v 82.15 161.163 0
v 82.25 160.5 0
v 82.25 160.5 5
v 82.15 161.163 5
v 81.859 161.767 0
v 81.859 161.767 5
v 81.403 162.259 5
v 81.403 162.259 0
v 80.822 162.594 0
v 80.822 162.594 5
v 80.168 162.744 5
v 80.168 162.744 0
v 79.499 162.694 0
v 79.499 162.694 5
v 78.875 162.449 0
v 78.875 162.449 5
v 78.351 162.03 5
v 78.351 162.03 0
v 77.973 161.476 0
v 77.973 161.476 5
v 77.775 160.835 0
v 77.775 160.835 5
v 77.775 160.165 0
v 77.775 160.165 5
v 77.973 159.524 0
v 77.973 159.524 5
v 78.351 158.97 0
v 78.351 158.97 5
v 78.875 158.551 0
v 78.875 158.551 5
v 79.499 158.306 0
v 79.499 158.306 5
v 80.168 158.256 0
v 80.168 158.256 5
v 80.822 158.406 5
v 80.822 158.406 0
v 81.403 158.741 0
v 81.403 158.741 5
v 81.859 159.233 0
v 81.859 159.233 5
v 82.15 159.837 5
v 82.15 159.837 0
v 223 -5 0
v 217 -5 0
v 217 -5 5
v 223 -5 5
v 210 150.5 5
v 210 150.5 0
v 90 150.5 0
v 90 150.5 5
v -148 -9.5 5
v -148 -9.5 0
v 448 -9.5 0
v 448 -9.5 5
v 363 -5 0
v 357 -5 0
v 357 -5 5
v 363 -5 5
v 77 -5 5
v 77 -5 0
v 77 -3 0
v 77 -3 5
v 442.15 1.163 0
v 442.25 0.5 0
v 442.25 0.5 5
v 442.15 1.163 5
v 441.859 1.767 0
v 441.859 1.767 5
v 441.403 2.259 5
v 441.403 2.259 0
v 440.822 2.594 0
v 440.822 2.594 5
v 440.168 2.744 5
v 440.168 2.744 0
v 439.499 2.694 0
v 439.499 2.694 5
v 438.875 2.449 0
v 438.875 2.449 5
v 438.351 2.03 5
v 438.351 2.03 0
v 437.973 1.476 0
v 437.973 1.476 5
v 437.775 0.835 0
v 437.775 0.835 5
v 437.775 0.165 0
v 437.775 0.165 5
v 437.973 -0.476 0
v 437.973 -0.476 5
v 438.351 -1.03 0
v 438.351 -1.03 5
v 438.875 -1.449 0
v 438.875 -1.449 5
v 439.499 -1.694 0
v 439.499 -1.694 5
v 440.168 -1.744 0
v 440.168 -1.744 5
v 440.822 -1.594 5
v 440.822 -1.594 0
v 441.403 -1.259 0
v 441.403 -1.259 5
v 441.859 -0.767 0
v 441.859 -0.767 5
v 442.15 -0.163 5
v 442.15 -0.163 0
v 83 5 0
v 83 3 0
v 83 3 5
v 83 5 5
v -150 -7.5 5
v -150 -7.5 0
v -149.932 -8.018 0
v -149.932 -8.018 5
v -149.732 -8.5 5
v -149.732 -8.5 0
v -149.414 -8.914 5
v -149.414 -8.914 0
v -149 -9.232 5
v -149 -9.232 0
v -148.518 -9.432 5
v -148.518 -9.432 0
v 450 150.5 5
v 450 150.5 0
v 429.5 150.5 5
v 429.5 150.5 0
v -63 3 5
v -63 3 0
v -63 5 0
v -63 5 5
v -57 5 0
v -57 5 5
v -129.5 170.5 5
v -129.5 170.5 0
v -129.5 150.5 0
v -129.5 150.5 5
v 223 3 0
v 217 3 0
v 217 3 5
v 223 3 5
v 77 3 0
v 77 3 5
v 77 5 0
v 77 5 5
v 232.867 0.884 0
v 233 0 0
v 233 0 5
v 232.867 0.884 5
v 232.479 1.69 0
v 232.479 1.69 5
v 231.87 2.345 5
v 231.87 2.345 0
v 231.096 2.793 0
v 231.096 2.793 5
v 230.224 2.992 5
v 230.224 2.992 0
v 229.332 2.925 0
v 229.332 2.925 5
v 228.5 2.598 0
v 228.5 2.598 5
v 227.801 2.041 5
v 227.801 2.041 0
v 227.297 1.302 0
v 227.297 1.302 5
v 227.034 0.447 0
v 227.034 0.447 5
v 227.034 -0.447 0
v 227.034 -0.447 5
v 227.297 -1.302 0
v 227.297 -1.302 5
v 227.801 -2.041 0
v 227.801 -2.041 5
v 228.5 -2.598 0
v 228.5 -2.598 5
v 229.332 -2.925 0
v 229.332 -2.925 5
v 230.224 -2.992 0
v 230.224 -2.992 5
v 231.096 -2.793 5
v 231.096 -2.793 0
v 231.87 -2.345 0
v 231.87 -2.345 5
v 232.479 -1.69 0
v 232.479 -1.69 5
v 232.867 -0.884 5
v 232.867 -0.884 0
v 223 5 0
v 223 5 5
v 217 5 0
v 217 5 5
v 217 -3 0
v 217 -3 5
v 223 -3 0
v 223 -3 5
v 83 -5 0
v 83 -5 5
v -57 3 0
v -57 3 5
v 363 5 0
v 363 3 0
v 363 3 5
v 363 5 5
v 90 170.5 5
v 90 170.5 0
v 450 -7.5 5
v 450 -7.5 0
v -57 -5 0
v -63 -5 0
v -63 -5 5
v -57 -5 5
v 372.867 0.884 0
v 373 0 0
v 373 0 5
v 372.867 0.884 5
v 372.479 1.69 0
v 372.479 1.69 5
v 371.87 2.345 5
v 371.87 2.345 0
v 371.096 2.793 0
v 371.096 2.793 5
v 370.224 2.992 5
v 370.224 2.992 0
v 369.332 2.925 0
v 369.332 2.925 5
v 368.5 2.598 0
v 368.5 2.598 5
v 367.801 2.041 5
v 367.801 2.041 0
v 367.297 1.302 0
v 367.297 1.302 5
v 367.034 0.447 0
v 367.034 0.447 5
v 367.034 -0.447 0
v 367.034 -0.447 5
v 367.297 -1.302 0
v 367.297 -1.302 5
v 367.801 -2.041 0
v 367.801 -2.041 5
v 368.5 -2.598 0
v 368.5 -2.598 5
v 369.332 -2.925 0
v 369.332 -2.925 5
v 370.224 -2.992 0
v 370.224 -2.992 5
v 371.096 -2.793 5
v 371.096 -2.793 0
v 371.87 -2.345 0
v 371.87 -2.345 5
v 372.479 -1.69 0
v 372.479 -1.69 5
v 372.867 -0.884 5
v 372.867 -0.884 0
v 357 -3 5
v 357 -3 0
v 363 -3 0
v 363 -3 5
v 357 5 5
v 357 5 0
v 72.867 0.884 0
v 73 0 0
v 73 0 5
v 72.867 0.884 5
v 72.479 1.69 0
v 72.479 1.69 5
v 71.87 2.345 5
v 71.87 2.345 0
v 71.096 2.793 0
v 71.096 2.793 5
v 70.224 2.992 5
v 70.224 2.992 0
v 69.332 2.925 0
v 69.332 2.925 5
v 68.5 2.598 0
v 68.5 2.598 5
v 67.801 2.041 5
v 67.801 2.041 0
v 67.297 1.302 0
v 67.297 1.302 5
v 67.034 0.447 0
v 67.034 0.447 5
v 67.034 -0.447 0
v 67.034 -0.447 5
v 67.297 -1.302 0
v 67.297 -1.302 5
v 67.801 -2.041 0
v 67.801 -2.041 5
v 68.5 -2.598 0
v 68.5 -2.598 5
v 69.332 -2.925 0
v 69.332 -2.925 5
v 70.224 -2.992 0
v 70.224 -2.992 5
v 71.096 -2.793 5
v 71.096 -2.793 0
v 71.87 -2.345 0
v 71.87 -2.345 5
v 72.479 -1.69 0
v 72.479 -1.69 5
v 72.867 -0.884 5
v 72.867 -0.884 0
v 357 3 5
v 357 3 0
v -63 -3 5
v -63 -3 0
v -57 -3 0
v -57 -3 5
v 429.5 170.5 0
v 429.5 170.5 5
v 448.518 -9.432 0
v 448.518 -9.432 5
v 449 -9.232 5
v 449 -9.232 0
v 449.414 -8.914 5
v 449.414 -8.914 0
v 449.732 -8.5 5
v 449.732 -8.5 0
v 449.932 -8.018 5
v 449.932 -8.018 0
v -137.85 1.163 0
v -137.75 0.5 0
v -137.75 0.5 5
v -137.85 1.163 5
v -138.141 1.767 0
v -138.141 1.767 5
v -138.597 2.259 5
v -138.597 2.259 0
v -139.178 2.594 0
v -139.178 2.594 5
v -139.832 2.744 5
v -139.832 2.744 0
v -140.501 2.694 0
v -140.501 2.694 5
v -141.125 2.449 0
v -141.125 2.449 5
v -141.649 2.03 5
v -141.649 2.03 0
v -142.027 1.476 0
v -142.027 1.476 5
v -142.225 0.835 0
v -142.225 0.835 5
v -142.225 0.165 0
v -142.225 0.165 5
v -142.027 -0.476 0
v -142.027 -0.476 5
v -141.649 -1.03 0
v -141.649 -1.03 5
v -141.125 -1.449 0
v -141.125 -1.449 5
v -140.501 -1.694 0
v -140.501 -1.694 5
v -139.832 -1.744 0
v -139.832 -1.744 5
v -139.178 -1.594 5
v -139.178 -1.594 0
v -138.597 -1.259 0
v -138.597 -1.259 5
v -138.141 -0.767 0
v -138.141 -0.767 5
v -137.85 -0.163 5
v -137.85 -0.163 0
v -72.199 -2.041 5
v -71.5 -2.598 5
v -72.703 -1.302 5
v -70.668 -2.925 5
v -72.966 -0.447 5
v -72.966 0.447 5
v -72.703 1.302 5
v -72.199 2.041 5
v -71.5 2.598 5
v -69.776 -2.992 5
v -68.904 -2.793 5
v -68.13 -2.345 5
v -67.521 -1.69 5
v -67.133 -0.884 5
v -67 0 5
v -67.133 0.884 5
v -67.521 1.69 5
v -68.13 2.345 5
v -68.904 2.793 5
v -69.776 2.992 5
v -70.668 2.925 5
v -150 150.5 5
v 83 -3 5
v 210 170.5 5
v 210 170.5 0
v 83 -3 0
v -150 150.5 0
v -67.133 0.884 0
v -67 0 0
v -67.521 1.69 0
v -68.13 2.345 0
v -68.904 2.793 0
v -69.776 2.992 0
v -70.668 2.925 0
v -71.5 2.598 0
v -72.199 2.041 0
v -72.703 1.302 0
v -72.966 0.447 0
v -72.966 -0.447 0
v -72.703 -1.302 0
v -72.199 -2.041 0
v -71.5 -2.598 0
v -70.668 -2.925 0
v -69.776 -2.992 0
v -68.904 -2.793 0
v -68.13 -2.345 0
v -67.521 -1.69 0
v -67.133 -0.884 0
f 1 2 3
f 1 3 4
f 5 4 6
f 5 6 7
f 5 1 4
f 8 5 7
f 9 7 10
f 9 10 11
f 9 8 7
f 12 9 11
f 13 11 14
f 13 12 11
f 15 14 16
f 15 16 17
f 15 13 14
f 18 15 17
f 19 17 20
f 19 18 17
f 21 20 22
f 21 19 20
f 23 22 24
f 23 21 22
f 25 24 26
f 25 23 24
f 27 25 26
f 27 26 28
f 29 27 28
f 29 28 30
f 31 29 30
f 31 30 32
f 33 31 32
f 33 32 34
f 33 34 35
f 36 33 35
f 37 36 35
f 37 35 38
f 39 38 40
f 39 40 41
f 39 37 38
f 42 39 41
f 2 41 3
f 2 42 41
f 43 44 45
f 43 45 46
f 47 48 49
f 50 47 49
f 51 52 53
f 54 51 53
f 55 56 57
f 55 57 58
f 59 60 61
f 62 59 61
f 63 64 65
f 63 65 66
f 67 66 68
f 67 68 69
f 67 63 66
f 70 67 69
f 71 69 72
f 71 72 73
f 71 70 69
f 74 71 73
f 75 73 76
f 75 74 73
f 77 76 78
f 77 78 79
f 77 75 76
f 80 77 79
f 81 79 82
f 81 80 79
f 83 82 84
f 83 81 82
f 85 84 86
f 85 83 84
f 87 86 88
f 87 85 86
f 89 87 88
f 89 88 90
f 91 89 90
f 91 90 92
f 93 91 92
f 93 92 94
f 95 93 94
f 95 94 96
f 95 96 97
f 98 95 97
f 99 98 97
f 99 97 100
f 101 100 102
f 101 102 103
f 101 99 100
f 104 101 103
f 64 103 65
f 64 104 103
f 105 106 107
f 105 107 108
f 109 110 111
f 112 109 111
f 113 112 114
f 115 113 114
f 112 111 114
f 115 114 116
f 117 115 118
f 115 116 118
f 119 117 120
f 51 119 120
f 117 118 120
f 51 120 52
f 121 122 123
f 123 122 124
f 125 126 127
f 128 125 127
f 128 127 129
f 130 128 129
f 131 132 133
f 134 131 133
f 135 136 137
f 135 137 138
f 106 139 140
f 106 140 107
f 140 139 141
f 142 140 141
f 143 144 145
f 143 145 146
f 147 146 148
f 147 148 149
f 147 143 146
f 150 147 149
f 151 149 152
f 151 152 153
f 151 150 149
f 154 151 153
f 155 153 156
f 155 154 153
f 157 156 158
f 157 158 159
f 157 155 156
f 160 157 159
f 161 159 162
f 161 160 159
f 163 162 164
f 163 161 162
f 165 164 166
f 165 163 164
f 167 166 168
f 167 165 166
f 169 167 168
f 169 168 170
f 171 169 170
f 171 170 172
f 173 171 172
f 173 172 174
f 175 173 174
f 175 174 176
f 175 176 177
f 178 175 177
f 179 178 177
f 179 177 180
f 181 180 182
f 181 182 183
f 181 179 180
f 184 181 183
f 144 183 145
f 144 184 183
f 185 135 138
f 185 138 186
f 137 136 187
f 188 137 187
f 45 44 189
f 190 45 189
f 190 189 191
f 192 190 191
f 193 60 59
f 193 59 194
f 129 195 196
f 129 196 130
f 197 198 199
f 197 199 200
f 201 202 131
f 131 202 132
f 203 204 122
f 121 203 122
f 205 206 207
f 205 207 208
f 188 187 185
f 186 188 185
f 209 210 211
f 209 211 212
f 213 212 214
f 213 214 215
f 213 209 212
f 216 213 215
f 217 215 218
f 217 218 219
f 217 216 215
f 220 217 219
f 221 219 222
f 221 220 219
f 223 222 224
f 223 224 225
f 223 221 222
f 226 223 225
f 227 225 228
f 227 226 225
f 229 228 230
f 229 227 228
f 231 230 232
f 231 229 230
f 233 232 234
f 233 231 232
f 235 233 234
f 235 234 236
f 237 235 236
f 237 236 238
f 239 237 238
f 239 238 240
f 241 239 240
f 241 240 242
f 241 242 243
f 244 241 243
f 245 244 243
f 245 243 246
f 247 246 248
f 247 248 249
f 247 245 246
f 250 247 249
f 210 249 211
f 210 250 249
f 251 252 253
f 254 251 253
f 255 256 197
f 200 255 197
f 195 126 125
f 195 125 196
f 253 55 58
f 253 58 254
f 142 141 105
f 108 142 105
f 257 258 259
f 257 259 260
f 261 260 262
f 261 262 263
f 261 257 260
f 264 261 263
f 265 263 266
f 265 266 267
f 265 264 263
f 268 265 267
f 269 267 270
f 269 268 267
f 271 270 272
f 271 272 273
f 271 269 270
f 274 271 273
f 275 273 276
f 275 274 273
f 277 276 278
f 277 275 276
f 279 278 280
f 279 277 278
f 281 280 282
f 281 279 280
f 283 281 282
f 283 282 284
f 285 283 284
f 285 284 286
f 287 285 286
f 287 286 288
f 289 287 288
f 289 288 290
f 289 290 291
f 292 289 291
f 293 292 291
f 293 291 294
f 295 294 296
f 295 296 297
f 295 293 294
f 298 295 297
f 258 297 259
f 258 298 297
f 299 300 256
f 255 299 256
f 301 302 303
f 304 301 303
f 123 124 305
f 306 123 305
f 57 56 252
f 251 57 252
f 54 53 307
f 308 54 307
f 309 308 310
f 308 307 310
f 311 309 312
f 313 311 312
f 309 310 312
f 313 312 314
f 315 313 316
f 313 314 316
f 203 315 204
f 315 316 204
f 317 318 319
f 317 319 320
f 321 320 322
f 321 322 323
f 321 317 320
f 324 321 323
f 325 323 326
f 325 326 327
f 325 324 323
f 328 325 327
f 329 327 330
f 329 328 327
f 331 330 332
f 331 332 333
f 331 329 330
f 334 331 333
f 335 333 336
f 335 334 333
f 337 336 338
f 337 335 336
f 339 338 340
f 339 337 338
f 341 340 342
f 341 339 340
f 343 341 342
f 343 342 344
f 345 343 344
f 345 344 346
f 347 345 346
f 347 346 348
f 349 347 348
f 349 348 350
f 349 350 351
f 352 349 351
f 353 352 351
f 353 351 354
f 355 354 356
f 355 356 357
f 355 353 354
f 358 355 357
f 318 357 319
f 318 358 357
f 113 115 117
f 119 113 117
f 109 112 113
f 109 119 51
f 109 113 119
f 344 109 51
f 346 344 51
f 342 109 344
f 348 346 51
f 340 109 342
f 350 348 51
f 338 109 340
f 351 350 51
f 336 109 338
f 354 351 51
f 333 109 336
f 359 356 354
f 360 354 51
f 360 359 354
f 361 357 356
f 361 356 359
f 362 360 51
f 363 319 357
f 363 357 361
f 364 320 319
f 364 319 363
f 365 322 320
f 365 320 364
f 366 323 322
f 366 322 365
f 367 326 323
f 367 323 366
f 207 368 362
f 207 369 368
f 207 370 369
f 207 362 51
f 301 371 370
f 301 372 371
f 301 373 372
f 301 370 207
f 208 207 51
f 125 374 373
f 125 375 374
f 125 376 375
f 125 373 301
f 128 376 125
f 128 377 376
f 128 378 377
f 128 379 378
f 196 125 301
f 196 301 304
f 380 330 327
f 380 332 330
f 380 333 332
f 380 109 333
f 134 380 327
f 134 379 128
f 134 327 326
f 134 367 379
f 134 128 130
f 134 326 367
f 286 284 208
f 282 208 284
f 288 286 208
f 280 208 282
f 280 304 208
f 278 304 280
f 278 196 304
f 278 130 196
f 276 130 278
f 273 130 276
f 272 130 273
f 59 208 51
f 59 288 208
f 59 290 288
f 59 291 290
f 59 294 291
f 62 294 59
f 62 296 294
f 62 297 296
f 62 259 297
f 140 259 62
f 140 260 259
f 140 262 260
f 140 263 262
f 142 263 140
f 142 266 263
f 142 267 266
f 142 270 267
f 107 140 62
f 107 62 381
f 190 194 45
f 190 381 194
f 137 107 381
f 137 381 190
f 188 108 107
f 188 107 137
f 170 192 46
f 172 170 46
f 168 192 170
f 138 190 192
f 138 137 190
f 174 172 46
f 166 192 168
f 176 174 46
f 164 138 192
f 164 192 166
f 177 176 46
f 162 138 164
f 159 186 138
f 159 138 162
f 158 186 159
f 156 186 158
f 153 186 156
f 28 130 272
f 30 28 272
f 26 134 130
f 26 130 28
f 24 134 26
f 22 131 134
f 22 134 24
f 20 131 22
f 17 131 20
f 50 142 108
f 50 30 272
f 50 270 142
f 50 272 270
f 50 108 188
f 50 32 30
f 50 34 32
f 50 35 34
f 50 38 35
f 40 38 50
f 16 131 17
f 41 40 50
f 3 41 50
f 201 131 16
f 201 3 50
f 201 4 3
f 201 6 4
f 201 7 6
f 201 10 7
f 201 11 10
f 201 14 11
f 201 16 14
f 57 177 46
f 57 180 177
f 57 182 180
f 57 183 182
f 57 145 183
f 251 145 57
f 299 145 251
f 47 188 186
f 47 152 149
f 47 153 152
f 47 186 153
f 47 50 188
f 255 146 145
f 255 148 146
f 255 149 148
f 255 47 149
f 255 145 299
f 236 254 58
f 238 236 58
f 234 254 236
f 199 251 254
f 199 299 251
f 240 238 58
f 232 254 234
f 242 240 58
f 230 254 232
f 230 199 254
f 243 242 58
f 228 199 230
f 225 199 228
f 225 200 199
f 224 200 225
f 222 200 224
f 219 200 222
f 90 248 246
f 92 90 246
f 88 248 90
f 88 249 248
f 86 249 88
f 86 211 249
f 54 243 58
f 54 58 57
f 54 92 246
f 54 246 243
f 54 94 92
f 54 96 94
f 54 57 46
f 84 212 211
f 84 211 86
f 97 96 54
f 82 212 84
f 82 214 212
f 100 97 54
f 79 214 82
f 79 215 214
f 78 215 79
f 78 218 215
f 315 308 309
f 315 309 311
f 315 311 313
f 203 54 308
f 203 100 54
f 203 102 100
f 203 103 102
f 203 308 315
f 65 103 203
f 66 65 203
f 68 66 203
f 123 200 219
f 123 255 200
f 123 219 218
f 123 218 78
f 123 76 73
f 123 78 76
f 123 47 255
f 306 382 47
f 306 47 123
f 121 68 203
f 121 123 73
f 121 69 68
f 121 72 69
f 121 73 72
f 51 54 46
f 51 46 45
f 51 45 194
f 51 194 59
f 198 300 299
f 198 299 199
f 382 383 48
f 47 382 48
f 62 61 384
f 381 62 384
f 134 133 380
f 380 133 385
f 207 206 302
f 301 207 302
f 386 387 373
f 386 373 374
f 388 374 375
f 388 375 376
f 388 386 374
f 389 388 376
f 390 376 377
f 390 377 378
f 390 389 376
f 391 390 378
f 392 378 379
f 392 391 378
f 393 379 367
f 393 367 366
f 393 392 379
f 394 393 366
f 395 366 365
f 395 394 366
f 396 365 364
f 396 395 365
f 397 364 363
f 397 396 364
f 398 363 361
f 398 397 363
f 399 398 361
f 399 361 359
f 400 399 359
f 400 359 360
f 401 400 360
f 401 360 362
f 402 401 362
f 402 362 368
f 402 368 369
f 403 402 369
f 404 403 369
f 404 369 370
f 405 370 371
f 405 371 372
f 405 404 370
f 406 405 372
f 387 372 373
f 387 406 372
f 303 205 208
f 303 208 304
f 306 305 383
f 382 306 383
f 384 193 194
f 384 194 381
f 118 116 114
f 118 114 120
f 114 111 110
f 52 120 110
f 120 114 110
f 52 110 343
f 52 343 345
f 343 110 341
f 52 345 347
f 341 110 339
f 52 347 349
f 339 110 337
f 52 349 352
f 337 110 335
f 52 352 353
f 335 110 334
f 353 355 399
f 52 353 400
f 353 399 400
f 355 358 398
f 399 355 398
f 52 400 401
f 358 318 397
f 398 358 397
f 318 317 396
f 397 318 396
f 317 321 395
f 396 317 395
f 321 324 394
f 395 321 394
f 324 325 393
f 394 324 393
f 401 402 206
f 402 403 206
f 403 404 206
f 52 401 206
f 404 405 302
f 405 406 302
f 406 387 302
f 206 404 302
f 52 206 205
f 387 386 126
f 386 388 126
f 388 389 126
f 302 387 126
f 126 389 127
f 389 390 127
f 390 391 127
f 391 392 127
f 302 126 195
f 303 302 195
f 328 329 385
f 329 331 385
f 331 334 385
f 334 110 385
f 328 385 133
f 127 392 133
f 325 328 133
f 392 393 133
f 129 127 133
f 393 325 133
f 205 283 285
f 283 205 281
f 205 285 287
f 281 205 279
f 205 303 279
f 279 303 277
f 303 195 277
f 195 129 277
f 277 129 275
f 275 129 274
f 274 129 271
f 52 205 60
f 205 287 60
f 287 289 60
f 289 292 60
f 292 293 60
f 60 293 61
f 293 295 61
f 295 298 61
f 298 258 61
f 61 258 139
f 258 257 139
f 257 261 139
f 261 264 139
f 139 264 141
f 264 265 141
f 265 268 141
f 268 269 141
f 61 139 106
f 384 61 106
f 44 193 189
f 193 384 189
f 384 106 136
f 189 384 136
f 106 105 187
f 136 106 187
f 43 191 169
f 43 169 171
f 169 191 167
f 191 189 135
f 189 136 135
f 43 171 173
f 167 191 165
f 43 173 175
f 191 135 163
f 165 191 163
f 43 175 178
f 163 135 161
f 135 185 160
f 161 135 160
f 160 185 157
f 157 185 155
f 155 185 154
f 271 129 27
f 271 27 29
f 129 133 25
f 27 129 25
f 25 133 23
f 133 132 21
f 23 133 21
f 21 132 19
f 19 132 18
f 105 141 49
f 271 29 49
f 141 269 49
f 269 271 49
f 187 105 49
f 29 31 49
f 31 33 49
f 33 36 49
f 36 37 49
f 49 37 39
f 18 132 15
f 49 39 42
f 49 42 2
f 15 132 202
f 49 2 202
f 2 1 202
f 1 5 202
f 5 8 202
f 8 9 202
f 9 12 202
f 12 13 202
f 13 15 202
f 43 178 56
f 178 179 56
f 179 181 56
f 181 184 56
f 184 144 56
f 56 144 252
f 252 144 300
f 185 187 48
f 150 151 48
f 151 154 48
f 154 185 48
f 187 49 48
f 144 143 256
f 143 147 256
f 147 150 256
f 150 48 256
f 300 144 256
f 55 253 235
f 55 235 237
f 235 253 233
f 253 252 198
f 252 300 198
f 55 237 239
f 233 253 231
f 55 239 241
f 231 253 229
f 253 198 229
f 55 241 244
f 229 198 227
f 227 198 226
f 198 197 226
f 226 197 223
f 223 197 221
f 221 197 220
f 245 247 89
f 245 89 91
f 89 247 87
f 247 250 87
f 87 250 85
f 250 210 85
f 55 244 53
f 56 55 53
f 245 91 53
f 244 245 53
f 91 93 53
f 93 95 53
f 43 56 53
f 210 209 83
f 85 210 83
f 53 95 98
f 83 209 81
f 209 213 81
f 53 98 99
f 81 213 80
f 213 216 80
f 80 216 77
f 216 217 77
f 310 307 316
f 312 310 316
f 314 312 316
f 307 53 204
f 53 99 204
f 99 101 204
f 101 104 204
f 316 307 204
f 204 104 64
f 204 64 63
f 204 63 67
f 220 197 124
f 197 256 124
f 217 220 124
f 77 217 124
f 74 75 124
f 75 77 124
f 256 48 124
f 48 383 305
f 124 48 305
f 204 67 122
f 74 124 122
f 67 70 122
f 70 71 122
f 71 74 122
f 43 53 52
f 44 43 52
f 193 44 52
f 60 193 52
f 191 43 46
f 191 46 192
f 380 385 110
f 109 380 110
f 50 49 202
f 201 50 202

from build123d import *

# Parameters (mm, degrees)
F0_R     = 2.25
F0_W     = 6
F0_H     = 2
F0_R_2   = 3
F1_DEPTH = 5


with BuildPart() as f1:
    # F0 (on Top) → F1 (new body)
    with BuildSketch(Plane.XY):
        with BuildLine():
            ThreePointArc((-150, -7.5), (-149.414214, -8.914214), (-148, -9.5))
            Line((-148, -9.5), (448, -9.5))
            ThreePointArc((448, -9.5), (449.414214, -8.914214), (450, -7.5))
            Line((450, -7.5), (450, 150.5))
            Line((450, 150.5), (429.5, 150.5))
            Line((429.5, 150.5), (429.5, 170.5))
            Line((429.5, 170.5), (210, 170.5))
            Line((210, 170.5), (210, 150.5))
            Line((210, 150.5), (90, 150.5))
            Line((90, 150.5), (90, 170.5))
            Line((90, 170.5), (-129.5, 170.5))
            Line((-129.5, 170.5), (-129.5, 150.5))
            Line((-129.5, 150.5), (-150, 150.5))
            Line((-150, 150.5), (-150, -7.5))
        make_face()
        with Locations((-140, 0.5)):
            Circle(F0_R, mode=Mode.SUBTRACT)
        with Locations((-60, -4)):
            Rectangle(F0_W, F0_H, mode=Mode.SUBTRACT)
        with Locations((-70, 0)):
            Circle(F0_R_2, mode=Mode.SUBTRACT)
        with Locations((-60, 4)):
            Rectangle(F0_W, F0_H, mode=Mode.SUBTRACT)
        with Locations((70, 0)):
            Circle(F0_R_2, mode=Mode.SUBTRACT)
        with Locations((80, -4)):
            Rectangle(F0_W, F0_H, mode=Mode.SUBTRACT)
        with Locations((80, 4)):
            Rectangle(F0_W, F0_H, mode=Mode.SUBTRACT)
        with Locations((220, -4)):
            Rectangle(F0_W, F0_H, mode=Mode.SUBTRACT)
        with Locations((220, 4)):
            Rectangle(F0_W, F0_H, mode=Mode.SUBTRACT)
        with Locations((230, 0)):
            Circle(F0_R_2, mode=Mode.SUBTRACT)
        with Locations((360, -4)):
            Rectangle(F0_W, F0_H, mode=Mode.SUBTRACT)
        with Locations((370, 0)):
            Circle(F0_R_2, mode=Mode.SUBTRACT)
        with Locations((360, 4)):
            Rectangle(F0_W, F0_H, mode=Mode.SUBTRACT)
        with Locations((440, 0.5)):
            Circle(F0_R, mode=Mode.SUBTRACT)
        with Locations((80, 160.5)):
            Circle(F0_R, mode=Mode.SUBTRACT)
    extrude(amount=F1_DEPTH)


solid = f1.part
